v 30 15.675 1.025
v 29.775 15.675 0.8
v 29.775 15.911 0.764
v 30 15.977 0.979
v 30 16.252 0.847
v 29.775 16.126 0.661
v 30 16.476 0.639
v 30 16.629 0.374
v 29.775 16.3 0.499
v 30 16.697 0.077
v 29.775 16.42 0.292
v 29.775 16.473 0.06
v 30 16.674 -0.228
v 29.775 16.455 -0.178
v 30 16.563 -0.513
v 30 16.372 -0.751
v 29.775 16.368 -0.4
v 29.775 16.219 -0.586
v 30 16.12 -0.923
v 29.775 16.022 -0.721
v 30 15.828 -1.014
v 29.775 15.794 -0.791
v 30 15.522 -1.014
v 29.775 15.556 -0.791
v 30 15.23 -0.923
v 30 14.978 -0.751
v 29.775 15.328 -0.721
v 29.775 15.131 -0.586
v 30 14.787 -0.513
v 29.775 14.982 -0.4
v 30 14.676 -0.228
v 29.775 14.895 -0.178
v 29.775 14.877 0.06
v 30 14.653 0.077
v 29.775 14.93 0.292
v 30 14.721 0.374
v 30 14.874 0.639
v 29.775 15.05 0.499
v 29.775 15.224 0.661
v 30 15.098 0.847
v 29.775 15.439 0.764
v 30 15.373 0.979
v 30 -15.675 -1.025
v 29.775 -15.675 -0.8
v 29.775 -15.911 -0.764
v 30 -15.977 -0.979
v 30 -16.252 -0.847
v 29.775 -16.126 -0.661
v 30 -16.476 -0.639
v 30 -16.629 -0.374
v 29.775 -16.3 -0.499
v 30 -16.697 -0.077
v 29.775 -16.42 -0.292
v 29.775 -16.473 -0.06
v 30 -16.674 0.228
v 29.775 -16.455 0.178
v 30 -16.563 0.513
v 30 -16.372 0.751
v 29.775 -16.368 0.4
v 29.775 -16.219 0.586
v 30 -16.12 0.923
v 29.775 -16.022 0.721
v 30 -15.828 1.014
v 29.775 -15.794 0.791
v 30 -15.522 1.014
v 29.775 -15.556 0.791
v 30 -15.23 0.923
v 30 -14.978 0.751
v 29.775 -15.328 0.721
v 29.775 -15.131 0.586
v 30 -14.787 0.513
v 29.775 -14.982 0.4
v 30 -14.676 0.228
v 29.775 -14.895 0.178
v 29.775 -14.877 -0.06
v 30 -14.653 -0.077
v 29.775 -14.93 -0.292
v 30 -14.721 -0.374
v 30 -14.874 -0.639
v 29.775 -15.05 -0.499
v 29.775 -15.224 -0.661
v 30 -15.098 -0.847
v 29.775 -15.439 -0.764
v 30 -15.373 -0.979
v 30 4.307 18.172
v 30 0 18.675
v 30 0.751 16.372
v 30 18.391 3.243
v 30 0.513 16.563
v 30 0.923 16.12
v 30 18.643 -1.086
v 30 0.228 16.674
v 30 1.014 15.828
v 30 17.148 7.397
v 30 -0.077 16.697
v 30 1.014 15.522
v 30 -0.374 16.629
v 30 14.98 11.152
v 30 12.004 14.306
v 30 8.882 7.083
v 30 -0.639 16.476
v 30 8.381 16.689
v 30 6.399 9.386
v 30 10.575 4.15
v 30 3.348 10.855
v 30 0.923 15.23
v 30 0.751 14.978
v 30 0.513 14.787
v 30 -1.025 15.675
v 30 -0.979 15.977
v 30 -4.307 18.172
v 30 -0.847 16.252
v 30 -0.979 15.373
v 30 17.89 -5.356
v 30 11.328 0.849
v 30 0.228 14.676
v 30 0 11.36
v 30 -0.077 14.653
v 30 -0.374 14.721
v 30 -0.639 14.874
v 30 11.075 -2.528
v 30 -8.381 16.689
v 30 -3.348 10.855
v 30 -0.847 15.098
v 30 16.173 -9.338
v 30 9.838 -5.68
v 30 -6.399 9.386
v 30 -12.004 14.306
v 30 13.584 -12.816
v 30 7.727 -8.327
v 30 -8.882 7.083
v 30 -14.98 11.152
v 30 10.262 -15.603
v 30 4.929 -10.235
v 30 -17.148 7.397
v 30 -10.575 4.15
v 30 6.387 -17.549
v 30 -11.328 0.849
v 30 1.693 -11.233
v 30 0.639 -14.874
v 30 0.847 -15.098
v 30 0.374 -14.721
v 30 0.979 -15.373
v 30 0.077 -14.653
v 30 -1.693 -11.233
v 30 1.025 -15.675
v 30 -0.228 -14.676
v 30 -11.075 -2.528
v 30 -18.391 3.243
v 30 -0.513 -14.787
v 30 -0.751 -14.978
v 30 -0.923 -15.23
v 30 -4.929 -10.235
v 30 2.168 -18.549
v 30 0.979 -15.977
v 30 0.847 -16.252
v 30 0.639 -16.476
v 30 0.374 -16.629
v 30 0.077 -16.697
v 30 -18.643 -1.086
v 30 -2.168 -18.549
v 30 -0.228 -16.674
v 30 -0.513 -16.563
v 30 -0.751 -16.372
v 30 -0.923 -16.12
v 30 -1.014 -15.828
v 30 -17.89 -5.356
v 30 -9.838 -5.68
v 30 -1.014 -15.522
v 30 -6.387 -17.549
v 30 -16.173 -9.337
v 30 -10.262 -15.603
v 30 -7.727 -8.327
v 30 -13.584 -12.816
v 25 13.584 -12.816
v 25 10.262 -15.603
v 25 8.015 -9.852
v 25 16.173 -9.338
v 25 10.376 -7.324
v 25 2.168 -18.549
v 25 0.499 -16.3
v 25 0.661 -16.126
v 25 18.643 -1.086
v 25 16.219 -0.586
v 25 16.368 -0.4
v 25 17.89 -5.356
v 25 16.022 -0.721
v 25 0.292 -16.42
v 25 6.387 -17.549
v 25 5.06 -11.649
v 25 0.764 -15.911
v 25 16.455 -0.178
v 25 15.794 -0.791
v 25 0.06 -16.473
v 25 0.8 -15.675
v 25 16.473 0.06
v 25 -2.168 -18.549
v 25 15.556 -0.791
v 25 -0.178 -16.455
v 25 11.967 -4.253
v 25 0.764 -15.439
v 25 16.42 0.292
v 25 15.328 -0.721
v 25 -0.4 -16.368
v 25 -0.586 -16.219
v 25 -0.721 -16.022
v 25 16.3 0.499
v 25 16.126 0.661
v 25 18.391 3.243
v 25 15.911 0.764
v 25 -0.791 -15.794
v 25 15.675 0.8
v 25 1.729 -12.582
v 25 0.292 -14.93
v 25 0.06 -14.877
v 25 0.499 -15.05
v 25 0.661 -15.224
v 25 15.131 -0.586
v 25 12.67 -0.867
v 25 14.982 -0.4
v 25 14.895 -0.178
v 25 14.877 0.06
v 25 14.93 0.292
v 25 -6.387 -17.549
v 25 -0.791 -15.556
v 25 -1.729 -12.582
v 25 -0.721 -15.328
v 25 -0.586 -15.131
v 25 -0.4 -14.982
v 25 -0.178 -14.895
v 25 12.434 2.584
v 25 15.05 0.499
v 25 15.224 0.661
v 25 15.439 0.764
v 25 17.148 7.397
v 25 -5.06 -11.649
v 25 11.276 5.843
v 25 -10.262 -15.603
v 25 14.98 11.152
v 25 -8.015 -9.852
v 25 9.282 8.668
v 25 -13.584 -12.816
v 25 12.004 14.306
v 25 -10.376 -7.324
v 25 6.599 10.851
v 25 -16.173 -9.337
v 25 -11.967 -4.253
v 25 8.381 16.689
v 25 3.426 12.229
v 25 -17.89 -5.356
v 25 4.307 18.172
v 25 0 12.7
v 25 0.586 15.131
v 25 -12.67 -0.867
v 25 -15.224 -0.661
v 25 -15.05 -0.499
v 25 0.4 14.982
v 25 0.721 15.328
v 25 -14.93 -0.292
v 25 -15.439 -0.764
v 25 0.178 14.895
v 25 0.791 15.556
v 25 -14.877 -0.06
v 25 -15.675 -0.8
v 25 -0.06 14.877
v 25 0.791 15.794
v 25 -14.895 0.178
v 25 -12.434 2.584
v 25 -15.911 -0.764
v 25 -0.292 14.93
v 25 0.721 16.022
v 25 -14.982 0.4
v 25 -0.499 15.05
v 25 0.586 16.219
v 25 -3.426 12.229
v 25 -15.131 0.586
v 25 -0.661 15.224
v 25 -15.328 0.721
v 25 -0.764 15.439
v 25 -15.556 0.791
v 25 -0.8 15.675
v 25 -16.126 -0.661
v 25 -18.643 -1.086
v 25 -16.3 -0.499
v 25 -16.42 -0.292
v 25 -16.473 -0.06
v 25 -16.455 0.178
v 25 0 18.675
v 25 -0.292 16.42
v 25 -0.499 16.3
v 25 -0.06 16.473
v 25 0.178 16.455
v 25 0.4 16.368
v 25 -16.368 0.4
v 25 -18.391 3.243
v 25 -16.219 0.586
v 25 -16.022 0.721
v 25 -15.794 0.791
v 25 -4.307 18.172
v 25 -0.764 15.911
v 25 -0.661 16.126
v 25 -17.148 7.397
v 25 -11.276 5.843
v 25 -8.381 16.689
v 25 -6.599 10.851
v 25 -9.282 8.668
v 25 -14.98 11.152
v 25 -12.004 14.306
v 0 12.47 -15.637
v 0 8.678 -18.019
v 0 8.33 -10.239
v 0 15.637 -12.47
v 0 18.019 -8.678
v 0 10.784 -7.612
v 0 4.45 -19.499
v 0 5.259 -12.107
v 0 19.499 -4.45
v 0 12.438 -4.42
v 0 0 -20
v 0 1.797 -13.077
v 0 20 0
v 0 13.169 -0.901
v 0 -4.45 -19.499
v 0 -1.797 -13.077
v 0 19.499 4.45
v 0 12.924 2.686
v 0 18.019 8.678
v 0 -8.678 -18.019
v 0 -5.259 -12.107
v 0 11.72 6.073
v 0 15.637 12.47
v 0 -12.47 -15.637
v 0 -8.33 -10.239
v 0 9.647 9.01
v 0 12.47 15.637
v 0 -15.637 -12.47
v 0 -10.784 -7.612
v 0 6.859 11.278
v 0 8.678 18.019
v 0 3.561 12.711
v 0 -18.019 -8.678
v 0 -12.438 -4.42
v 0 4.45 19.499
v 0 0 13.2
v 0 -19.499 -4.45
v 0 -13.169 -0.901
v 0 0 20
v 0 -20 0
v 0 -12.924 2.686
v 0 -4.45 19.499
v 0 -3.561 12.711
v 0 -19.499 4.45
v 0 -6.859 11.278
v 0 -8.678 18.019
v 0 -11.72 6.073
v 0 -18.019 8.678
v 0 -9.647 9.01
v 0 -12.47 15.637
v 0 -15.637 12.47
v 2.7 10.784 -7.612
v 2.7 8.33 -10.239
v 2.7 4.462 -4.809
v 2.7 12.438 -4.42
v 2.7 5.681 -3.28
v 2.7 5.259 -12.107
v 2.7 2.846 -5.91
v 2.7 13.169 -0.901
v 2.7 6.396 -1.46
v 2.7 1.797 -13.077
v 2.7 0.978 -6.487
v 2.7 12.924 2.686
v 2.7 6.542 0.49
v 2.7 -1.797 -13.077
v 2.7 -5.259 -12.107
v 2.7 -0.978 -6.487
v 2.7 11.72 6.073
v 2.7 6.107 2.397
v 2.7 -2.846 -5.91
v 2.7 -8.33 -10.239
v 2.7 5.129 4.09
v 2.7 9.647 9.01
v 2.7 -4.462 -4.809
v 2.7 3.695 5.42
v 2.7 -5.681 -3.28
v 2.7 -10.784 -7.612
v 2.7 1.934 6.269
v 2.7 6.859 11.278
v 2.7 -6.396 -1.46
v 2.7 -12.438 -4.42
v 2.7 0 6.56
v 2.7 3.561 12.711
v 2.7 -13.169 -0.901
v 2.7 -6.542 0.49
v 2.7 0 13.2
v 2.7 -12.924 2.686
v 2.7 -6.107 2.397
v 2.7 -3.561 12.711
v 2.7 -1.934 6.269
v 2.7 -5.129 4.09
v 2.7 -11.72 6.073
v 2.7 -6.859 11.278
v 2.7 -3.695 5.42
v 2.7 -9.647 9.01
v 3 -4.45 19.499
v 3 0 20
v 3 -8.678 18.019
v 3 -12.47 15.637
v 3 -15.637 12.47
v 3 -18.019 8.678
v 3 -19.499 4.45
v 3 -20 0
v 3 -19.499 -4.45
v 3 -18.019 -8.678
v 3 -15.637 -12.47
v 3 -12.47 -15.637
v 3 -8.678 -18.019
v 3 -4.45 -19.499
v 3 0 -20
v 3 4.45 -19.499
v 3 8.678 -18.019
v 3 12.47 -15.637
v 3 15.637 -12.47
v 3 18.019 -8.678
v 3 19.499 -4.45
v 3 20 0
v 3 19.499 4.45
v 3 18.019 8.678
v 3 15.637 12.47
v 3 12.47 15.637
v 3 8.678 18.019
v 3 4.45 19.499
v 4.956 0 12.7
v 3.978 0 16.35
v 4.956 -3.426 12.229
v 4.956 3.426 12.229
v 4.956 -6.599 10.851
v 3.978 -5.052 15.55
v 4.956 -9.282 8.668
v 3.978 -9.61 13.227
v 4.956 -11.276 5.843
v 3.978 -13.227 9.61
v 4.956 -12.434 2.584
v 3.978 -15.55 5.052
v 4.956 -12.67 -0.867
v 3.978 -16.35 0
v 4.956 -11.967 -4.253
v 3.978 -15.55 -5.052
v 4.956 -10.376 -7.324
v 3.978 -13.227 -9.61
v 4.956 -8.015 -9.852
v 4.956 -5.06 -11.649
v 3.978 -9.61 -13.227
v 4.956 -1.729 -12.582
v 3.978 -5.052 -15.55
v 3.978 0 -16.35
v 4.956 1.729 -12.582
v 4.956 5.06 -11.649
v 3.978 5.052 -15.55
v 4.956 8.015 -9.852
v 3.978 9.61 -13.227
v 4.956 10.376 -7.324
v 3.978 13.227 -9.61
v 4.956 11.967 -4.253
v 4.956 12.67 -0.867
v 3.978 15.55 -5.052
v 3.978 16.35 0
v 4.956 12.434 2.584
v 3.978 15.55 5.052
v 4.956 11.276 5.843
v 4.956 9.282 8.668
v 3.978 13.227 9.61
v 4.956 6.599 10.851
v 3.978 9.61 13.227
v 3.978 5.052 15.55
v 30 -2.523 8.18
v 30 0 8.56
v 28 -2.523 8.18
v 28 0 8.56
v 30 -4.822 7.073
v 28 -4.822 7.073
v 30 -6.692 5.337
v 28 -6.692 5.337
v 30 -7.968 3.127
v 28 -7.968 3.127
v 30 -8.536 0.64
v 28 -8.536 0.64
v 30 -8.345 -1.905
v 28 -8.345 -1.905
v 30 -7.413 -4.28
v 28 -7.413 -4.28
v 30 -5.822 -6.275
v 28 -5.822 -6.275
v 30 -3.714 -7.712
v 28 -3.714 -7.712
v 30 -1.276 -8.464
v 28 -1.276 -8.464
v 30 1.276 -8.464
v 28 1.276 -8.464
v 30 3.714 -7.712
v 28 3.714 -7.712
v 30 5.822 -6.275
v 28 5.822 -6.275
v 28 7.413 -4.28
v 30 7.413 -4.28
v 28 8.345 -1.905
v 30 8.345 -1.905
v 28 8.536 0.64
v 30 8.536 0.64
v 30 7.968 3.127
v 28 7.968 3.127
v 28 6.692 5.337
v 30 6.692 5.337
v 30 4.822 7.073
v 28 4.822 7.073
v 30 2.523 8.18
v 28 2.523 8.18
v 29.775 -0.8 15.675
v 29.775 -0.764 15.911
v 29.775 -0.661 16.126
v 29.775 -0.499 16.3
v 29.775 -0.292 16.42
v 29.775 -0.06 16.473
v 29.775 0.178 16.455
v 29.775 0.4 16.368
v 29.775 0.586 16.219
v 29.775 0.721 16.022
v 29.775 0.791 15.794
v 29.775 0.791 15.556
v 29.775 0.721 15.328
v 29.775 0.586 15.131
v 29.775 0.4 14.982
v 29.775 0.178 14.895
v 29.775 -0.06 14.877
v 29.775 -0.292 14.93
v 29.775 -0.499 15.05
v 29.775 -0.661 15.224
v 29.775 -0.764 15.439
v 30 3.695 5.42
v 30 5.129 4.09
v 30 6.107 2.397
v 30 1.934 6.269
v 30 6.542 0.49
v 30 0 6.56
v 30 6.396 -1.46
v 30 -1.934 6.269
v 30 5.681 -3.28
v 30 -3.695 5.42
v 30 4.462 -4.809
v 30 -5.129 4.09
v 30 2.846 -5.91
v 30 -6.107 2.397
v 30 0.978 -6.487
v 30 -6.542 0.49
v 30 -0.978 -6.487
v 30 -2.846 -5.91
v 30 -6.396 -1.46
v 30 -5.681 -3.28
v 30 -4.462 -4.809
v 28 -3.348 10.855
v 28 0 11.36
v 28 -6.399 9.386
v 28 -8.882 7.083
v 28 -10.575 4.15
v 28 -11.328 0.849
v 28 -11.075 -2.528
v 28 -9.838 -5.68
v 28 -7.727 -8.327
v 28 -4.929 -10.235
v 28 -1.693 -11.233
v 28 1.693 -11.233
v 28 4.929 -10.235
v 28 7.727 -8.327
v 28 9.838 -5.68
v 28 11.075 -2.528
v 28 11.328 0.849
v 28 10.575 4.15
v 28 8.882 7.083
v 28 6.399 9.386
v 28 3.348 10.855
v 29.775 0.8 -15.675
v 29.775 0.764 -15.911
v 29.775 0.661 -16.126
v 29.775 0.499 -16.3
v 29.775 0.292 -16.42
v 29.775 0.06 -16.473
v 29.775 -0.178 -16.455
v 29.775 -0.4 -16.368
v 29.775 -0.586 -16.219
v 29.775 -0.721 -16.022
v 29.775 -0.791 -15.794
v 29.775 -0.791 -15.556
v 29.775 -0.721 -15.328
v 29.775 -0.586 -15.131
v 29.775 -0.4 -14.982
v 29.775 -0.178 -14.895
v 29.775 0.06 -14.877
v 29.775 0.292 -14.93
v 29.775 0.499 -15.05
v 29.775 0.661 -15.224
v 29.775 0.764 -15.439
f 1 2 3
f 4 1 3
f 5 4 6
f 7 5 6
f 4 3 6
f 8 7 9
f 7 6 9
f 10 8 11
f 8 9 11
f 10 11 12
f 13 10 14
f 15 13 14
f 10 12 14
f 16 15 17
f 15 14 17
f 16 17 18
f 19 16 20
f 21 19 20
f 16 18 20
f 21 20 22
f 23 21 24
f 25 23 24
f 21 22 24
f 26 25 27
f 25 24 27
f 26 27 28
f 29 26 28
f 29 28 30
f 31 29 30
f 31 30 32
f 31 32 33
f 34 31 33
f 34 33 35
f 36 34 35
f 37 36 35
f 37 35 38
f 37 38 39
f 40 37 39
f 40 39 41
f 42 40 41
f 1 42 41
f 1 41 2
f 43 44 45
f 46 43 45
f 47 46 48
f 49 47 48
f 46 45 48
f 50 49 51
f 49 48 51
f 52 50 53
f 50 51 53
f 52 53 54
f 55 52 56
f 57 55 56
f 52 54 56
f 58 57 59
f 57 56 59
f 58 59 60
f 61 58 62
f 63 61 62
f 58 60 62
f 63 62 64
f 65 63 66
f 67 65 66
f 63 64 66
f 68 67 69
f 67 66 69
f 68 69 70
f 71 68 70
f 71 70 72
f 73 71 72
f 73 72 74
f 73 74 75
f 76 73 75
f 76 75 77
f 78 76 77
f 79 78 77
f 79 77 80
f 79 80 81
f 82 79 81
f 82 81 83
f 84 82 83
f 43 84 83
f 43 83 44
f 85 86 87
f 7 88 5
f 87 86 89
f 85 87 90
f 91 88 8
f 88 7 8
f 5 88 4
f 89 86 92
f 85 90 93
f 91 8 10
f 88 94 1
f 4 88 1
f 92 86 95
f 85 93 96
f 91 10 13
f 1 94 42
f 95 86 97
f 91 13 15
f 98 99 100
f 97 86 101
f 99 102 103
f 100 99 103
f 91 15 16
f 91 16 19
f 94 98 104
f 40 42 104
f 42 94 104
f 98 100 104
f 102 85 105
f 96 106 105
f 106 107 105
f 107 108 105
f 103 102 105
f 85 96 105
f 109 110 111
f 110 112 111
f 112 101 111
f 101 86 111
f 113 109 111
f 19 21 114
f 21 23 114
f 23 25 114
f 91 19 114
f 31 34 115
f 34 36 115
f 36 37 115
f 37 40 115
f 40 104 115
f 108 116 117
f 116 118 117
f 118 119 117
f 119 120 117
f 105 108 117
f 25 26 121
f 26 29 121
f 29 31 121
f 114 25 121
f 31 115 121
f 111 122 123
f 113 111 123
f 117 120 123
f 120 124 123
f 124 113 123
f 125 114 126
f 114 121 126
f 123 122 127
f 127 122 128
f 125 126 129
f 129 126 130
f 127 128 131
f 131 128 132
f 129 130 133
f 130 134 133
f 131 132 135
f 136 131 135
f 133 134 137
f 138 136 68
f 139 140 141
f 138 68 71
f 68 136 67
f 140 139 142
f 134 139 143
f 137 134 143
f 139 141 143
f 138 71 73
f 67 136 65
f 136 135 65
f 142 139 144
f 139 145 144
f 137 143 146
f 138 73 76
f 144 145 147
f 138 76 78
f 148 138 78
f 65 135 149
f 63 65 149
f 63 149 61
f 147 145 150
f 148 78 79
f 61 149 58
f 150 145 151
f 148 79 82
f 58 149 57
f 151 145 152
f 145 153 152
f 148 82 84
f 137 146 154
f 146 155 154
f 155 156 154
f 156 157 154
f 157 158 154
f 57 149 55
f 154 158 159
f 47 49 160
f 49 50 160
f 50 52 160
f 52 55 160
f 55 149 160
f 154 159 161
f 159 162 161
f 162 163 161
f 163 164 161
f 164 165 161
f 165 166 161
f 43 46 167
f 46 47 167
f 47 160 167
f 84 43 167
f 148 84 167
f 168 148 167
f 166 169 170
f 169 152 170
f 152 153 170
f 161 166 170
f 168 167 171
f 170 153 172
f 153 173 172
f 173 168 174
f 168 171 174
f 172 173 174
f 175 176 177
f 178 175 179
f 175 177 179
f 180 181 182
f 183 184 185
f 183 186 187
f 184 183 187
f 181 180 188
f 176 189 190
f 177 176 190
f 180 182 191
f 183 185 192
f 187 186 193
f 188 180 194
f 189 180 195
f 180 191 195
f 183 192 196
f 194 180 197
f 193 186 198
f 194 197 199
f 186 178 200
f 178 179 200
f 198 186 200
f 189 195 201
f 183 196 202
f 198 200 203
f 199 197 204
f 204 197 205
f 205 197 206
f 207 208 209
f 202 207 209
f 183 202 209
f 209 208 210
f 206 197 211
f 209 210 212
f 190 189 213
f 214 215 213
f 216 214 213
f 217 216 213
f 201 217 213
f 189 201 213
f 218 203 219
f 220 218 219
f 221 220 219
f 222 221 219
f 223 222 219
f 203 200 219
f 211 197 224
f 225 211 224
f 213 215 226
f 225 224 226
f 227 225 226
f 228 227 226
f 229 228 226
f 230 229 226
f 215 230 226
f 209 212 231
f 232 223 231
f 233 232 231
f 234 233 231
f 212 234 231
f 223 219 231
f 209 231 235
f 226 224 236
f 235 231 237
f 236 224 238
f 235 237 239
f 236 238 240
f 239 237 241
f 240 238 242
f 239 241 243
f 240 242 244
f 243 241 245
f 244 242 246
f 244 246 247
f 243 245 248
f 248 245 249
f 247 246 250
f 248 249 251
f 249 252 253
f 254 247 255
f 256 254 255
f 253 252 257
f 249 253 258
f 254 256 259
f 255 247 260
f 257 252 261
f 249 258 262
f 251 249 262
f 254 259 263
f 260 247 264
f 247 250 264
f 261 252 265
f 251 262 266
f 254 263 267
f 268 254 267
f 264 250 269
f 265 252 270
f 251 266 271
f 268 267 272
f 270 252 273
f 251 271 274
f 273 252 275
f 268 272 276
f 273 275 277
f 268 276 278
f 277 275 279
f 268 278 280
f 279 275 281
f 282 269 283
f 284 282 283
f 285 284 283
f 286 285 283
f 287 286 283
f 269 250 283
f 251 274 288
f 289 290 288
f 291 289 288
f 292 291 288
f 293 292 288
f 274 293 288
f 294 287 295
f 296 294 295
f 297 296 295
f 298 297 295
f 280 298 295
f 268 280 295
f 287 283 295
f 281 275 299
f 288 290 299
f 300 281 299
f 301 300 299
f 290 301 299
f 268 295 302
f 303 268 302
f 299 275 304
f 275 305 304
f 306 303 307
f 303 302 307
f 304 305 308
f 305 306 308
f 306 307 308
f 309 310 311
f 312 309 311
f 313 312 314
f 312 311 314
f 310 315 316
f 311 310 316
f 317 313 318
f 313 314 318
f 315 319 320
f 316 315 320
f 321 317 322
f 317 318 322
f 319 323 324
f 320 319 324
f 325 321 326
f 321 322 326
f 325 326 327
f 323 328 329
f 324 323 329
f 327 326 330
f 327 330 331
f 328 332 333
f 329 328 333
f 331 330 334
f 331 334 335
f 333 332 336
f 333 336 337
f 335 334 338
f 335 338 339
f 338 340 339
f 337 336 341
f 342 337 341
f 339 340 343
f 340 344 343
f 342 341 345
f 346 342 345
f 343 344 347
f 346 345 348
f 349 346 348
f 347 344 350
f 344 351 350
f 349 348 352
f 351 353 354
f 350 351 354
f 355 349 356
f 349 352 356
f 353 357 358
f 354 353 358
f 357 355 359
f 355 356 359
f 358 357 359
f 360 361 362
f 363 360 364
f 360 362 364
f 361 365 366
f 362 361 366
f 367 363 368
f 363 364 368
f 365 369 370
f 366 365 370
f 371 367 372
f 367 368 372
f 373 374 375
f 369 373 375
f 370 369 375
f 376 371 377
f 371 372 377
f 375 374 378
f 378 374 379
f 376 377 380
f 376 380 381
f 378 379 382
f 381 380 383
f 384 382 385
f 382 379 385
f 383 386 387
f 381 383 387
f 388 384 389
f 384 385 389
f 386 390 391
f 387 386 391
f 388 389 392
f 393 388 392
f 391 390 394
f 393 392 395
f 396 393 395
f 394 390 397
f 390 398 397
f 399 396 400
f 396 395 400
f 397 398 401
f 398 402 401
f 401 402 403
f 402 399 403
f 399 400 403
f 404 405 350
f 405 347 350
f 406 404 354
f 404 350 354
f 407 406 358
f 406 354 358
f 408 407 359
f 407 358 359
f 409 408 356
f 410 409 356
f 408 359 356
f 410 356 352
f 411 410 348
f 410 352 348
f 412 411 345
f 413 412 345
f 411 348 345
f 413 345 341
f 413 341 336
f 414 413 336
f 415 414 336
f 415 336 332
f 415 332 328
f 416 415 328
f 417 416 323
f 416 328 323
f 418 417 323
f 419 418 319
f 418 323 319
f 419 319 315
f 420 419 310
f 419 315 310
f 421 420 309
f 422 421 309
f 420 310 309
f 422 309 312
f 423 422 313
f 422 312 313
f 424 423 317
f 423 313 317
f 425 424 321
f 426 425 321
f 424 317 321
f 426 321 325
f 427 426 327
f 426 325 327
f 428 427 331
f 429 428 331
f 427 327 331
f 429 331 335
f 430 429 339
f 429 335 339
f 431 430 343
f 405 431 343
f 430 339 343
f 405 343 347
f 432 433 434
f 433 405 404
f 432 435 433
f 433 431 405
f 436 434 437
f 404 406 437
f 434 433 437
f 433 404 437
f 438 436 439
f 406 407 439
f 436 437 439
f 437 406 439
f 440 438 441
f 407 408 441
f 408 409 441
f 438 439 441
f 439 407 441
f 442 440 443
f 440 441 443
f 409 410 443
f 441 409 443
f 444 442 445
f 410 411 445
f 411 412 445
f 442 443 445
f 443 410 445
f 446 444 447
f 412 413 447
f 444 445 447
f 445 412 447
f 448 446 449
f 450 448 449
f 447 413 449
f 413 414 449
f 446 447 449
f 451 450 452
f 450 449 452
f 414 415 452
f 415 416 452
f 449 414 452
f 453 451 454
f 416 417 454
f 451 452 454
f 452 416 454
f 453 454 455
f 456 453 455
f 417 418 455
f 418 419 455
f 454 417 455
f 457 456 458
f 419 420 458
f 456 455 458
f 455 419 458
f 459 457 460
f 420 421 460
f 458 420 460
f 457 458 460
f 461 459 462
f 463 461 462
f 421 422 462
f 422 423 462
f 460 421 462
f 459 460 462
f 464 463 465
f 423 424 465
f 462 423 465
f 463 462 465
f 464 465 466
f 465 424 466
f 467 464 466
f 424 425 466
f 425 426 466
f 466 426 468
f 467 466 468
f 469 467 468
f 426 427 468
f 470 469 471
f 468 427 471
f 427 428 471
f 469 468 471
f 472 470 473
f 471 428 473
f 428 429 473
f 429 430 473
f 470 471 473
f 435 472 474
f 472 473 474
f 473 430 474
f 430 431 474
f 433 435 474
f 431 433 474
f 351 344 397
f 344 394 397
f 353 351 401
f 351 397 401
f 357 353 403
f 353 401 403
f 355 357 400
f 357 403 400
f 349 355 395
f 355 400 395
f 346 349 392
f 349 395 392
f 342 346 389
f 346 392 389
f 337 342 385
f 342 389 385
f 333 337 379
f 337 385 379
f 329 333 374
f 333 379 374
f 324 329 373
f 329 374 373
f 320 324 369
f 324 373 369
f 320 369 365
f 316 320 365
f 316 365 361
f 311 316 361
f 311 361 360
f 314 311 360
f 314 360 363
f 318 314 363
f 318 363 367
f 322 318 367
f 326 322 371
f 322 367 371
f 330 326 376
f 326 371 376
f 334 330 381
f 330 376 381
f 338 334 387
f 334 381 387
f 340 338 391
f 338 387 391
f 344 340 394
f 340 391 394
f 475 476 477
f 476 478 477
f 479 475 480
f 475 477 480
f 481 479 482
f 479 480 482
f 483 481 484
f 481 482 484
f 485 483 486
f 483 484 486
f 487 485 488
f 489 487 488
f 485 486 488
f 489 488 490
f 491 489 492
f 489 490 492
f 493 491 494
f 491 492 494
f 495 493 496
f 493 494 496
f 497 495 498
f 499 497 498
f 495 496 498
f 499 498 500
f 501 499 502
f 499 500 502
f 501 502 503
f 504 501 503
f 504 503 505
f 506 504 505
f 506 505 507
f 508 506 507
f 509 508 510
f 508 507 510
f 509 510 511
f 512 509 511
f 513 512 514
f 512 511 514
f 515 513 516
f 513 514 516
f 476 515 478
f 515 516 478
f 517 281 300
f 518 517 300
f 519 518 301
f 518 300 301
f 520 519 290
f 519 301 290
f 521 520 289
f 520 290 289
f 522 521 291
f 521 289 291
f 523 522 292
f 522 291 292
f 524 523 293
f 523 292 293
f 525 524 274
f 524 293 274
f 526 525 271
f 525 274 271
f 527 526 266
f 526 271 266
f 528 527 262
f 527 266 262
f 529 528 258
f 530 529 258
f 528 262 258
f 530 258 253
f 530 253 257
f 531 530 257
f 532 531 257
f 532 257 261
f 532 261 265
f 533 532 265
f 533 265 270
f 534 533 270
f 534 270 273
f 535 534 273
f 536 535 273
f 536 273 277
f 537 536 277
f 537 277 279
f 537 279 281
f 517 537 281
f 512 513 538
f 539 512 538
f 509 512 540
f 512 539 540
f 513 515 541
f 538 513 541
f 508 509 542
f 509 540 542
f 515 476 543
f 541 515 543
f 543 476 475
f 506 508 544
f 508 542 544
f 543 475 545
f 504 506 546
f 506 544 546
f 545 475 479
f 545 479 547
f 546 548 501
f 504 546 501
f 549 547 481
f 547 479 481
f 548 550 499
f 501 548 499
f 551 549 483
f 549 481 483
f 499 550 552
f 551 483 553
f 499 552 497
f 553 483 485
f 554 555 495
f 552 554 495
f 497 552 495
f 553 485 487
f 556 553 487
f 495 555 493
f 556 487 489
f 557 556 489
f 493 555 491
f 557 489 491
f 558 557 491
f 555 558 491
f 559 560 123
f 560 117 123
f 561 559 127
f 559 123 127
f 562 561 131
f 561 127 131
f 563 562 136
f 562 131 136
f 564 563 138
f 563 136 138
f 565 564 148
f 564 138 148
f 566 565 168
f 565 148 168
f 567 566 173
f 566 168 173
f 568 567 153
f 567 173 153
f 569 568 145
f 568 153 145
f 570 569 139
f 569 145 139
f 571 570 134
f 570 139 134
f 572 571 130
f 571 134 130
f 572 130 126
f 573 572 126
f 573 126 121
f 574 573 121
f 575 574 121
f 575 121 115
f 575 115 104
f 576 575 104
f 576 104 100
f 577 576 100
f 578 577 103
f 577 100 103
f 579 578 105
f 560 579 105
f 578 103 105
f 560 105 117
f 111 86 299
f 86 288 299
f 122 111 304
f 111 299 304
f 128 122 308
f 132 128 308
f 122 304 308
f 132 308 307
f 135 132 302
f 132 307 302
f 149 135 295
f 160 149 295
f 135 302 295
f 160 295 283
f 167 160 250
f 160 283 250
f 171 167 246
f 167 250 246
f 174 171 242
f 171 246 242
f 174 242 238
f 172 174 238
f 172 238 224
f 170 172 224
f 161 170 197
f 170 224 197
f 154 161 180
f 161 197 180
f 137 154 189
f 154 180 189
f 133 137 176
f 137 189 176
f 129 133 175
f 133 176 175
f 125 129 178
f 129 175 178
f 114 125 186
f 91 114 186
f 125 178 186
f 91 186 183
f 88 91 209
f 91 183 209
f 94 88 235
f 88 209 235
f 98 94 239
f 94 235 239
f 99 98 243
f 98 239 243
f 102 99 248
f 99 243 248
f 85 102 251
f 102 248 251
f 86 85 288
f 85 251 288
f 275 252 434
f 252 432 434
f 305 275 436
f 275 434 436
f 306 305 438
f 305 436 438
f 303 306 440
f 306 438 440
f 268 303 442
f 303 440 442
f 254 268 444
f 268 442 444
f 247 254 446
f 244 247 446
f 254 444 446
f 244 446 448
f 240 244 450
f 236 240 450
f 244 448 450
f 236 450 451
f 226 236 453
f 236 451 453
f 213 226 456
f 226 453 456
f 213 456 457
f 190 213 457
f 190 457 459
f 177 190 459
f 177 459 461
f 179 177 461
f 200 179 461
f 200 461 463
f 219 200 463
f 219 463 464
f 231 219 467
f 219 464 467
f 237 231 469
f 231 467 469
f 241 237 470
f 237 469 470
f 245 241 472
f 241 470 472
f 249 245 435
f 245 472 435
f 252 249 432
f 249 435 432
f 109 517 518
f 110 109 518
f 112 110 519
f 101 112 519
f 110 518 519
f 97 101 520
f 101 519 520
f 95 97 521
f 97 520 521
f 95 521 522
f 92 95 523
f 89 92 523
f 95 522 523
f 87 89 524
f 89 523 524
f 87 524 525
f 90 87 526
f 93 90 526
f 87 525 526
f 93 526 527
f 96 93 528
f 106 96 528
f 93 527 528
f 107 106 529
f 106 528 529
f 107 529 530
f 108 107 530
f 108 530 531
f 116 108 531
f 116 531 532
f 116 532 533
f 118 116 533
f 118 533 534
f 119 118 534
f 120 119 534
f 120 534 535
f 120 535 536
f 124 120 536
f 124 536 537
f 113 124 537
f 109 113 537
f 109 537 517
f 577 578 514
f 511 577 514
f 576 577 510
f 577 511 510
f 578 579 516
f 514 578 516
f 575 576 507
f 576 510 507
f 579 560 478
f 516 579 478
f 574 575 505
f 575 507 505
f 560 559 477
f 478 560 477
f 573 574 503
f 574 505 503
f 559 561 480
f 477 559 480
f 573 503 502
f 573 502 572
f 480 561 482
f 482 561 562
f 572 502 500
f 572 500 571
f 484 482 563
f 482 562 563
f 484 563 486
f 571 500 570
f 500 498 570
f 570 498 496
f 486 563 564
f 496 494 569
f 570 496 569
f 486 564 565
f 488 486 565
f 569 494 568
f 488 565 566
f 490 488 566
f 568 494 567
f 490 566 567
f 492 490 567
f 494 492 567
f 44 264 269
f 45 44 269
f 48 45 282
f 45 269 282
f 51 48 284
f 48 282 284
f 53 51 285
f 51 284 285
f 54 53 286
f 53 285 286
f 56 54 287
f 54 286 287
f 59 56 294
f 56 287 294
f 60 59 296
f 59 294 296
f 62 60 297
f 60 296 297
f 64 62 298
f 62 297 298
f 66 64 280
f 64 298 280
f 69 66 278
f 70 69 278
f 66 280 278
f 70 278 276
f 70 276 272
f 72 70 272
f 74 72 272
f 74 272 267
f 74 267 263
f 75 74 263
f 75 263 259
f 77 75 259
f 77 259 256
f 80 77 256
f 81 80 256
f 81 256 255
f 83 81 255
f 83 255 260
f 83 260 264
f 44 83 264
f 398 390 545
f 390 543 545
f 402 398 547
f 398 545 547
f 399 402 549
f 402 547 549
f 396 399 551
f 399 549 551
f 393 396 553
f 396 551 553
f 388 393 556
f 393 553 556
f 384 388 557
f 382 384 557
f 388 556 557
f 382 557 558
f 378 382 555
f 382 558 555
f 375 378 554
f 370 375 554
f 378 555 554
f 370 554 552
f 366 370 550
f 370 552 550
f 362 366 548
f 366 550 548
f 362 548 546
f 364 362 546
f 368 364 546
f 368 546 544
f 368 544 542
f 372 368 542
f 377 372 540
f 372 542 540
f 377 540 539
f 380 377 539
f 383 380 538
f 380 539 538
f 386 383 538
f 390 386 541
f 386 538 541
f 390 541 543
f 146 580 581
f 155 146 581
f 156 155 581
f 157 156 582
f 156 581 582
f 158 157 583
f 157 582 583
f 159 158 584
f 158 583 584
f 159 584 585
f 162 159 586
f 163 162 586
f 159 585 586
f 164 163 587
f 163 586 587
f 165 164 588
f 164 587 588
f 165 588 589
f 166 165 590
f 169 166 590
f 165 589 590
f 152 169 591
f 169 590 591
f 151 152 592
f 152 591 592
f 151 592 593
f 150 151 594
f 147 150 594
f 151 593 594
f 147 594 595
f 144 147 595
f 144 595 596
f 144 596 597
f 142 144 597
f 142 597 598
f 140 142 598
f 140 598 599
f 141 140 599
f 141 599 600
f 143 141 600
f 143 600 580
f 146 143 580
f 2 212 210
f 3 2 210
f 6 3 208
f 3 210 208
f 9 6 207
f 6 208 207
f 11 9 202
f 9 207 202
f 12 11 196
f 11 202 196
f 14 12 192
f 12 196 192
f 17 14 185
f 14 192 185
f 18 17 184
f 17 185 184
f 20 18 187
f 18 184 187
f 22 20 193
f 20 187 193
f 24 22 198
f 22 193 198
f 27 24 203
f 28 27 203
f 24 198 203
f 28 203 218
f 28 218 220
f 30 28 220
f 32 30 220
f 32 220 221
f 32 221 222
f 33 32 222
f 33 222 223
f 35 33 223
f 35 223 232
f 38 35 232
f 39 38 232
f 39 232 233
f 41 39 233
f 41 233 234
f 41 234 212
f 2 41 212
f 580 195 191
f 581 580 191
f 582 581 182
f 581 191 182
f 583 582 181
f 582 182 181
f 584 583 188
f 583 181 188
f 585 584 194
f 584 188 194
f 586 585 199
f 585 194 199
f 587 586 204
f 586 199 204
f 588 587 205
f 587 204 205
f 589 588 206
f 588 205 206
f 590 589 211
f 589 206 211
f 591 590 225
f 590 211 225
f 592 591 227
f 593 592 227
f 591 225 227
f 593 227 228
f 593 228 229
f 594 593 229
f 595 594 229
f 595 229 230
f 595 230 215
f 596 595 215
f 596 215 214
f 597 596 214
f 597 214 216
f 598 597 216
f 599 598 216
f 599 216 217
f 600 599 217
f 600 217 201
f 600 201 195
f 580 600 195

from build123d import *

# Parameters (mm, degrees)
HOLE_WIZARD_M21_D           = 1.6
HOLE_WIZARD_M21_DEPTH       = 5
HOLE_WIZARD_M21_CSINK_D     = 2.05
HOLE_WIZARD_M21_CSINK_ANGLE = 90
PATTERN_CIRCULAR_1_COUNT    = 4


with BuildPart() as part:
    # Эскиз1 → Повернуть1 (revolve)
    with BuildSketch(Plane.XY, mode=Mode.PRIVATE) as revolve_1_sk:
        Polygon((0, 20), (0, 13.2), (2.7, 13.2), (2.7, 6.56), (30, 6.56), (30, 8.56), (28, 8.56), (28, 11.36), (30, 11.36), (30, 18.675), (25, 18.675), (25, 12.7), (4.956029105, 12.7), (3, 20), align=None)
    revolve(revolve_1_sk.sketch.rotate(Axis((-29.041238464, 0, 0), (1, 0, 0)), 90), axis=Axis((-29.041238464, 0, 0), (1, 0, 0)))

    # Отверстие обработанное метчиком M21
    with Locations(Plane(origin=(30, 0, 0), x_dir=(0, 0, -1), z_dir=(1, 0, 0))):
        with Locations((0, 15.675)):
            hole_wizard_m21 = CounterSinkHole(HOLE_WIZARD_M21_D / 2, HOLE_WIZARD_M21_CSINK_D / 2, depth=HOLE_WIZARD_M21_DEPTH, counter_sink_angle=HOLE_WIZARD_M21_CSINK_ANGLE)

    # Круговой массив1: Отверстие обработанное метчиком M21 ×4 about axis
    pattern_circular_1_axis = Axis((0, 0, 0), (1, 0, 0))
    for i in range(1, PATTERN_CIRCULAR_1_COUNT):
        add(hole_wizard_m21.rotate(pattern_circular_1_axis, i * 360 / PATTERN_CIRCULAR_1_COUNT), mode=Mode.SUBTRACT)


solid = part.part
